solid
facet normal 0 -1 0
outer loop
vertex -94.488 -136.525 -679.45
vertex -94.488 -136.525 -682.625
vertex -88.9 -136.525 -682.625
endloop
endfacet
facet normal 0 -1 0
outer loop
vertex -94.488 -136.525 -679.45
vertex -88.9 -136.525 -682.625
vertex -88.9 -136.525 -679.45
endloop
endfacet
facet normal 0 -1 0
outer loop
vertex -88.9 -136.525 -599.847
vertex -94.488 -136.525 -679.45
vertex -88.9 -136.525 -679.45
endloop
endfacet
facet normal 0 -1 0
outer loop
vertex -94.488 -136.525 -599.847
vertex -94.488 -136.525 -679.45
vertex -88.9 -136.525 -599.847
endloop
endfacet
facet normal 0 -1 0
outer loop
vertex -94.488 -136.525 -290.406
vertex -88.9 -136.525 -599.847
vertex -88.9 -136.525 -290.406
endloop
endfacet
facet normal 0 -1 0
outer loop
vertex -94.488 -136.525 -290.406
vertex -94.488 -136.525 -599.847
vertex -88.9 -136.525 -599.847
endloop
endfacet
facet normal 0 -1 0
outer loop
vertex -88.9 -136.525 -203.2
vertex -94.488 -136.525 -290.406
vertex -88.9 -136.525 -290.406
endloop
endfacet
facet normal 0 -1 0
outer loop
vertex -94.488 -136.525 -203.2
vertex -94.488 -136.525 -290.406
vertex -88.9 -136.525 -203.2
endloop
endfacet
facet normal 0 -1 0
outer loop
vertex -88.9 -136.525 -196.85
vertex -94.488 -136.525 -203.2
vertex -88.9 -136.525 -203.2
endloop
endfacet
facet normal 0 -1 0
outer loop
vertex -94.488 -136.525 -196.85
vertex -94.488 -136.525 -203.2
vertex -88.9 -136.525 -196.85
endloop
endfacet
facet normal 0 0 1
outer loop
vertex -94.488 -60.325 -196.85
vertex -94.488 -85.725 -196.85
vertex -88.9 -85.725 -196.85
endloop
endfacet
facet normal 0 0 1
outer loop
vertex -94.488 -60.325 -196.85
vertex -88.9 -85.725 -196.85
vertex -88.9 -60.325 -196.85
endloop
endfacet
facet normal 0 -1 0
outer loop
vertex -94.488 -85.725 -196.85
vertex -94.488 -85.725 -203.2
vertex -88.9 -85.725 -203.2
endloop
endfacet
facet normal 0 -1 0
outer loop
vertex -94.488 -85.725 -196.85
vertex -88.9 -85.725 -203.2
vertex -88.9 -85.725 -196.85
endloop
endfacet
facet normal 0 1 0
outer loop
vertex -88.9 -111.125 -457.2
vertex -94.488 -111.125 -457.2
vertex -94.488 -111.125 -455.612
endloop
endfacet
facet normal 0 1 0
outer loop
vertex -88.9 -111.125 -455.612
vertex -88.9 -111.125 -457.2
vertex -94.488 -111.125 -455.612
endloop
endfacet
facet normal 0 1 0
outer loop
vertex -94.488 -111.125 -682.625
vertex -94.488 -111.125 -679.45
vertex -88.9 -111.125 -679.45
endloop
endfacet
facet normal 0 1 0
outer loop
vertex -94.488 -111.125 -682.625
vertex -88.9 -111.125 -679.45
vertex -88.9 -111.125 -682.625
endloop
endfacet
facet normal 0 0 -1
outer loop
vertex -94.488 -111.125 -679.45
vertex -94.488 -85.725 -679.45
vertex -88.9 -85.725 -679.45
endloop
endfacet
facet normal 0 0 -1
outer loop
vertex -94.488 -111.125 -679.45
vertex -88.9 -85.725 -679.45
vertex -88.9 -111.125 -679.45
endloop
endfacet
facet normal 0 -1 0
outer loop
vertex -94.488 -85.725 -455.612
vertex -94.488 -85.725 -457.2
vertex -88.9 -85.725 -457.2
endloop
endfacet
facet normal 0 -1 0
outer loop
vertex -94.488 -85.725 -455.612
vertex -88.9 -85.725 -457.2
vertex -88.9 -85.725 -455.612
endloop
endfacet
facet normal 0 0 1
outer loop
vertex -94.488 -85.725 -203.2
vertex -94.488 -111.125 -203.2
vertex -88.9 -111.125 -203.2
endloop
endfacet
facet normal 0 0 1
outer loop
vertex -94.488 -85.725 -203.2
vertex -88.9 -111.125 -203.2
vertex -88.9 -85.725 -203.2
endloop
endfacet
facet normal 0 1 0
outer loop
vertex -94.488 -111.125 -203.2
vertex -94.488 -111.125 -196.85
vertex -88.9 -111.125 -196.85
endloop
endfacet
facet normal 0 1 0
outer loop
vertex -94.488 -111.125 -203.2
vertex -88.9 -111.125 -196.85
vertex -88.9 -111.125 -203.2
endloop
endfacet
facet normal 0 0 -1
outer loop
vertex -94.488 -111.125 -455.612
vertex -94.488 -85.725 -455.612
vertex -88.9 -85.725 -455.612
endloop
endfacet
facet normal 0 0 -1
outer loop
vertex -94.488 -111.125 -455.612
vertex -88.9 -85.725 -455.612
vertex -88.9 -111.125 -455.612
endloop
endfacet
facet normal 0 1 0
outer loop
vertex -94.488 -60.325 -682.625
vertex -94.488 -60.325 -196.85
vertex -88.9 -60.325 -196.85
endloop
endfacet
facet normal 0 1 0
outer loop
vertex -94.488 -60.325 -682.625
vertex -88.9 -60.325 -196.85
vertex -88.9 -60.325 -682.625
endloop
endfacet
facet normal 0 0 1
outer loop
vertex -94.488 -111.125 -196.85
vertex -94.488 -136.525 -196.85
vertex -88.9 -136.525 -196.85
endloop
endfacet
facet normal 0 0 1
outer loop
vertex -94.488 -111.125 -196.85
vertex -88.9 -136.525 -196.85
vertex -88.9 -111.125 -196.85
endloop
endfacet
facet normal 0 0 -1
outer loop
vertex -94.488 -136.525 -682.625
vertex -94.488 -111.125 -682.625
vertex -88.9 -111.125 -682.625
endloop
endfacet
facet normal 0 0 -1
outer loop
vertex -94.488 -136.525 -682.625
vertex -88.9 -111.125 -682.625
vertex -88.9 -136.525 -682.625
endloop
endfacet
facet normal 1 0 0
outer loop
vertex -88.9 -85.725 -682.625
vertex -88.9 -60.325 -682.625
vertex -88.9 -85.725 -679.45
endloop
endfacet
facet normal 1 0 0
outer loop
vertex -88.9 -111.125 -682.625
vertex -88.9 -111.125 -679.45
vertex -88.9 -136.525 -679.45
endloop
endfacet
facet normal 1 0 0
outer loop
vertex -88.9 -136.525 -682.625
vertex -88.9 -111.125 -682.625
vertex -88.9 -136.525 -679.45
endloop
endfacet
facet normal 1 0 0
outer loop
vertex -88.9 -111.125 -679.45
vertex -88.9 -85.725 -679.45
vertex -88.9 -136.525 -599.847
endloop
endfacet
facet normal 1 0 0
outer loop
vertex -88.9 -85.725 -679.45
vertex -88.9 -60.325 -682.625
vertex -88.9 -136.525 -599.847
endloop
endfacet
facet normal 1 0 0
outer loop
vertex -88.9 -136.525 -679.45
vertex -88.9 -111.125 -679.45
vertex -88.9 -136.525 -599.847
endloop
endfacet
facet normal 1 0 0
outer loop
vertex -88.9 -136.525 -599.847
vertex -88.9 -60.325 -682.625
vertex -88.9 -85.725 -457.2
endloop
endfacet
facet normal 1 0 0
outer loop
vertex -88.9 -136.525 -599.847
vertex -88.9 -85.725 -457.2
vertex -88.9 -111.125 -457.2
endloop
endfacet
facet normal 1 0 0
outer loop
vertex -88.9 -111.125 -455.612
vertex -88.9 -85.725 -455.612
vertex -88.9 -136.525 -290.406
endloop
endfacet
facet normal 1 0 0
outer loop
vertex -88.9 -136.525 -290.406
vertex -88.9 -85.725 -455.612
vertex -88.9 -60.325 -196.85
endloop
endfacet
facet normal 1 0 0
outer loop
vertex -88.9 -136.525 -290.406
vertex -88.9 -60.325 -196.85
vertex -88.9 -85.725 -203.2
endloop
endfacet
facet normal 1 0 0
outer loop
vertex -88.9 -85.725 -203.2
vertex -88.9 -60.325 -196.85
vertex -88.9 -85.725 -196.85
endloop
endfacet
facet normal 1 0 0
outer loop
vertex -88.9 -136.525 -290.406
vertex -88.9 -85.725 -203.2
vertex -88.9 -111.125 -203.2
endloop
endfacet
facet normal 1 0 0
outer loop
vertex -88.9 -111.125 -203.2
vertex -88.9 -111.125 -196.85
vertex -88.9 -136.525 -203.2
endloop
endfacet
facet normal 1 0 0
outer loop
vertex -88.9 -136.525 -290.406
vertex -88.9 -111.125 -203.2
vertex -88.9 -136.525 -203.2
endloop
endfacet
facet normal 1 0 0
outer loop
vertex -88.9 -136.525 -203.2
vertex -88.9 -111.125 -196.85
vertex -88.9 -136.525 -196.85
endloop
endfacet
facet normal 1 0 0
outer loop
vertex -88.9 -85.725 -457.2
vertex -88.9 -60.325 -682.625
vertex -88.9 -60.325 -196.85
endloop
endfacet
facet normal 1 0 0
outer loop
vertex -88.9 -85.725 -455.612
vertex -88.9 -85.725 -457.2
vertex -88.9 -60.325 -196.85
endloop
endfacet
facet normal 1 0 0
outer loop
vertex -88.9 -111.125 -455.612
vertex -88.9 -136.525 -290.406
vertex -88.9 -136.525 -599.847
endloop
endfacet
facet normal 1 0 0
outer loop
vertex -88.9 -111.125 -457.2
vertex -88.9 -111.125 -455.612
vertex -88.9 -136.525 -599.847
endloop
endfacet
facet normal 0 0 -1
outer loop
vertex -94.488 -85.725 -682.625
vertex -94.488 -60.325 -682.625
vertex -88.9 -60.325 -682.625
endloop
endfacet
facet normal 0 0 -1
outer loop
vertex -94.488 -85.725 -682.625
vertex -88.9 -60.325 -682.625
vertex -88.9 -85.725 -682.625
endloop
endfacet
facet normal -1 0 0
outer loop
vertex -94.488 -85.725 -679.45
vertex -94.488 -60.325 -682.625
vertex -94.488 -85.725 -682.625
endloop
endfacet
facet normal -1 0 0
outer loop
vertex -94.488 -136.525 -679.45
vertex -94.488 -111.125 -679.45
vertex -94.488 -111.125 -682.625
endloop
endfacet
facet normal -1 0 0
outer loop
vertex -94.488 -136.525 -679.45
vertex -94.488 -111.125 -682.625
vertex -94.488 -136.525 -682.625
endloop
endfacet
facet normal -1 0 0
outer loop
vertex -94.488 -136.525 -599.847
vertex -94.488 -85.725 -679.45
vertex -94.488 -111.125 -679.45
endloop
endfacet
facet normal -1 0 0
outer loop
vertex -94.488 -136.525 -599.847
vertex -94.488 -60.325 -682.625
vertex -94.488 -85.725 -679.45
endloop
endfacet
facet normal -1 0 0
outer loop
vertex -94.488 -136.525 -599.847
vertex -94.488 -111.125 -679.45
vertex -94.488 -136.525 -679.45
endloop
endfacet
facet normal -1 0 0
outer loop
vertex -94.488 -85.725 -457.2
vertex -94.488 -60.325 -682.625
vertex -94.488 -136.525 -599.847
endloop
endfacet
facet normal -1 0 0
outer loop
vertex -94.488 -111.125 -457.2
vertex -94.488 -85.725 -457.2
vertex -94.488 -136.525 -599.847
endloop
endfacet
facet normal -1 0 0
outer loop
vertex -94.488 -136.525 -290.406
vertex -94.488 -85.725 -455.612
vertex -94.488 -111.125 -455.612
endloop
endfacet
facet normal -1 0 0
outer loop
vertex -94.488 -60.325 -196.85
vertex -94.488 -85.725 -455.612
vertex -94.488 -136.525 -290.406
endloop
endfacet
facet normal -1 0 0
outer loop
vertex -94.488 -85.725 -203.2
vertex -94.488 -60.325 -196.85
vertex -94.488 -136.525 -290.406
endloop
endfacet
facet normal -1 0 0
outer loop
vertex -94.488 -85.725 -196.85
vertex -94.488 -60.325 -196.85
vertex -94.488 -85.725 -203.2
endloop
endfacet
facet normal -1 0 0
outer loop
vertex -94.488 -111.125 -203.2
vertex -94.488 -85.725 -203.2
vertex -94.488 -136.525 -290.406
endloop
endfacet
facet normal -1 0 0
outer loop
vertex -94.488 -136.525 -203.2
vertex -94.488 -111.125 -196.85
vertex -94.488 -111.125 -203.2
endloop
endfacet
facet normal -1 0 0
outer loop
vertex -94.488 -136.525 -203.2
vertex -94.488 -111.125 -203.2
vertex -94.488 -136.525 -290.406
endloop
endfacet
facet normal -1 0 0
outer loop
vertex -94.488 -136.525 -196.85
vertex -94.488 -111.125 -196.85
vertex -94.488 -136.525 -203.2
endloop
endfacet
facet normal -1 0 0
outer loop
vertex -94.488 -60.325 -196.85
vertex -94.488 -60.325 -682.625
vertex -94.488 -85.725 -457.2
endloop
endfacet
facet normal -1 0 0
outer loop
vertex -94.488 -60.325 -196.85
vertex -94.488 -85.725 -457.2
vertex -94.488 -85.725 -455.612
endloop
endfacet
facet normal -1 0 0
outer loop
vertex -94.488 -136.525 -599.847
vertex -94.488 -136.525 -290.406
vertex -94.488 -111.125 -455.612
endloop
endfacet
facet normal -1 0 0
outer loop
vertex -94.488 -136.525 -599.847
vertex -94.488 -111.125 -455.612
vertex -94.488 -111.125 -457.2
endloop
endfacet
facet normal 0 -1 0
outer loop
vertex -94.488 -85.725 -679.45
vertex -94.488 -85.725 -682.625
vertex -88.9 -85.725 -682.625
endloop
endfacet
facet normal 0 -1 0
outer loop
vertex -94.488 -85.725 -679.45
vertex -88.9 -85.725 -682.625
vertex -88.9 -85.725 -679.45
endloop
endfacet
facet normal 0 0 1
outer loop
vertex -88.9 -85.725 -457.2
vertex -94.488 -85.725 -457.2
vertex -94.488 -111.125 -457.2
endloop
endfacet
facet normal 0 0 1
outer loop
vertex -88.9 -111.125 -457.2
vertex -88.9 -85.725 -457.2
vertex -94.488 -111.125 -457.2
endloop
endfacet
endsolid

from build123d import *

# Parameters (mm, degrees)
SKETCH1_W           = 25.4
SKETCH1_H           = 1.5875
BOSS_EXTRUDE1_DEPTH = 5.588
SKETCH2_W           = 545.634359946
SKETCH2_H           = 68.698432751
CUT_EXTRUDE1_DEPTH  = 7.62


with BuildPart() as part:
    # Sketch1 → Boss-Extrude1 (new body)
    # profile 1 of 3: a face of its own
    with BuildSketch(Plane(origin=(-94.488, 0, 0), x_dir=(0, -1, 0), z_dir=(-1, 0, 0))):
        Polygon((136.525, -196.85), (111.125, -196.85), (111.125, -203.2), (85.725, -203.2), (85.725, -196.85), (60.325, -196.85), (60.325, -682.625), (85.725, -682.625), (85.725, -679.45), (111.125, -679.45), (111.125, -682.625), (136.525, -682.625), align=None)
        with Locations((98.425, -456.40625)):
            Rectangle(SKETCH1_W, SKETCH1_H, mode=Mode.SUBTRACT)
    # profile 2 of 3: a face of its own
    with BuildSketch(Plane(origin=(-94.488, 0, 0), x_dir=(0, -1, 0), z_dir=(-1, 0, 0))):
        with BuildLine():
            Line((149.225, -203.2), (136.525, -203.2))
            Line((136.525, -203.2), (136.525, -290.406498707))
            ThreePointArc((136.525, -290.406498707), (137.30121982, -286.034603668), (139.534994681, -282.197126202))
            Line((139.534994681, -282.197126202), (184.118202659, -229.57294303))
            ThreePointArc((184.118202659, -229.57294303), (185.23509009, -227.654204297), (185.6232, -225.468256778))
            Line((185.6232, -225.468256778), (185.6232, -203.2))
            Line((185.6232, -203.2), (168.275, -203.2))
            Line((168.275, -203.2), (168.275, -196.85))
            Line((168.275, -196.85), (149.225, -196.85))
            Line((149.225, -196.85), (149.225, -203.2))
        make_face()
    # profile 3 of 3: a face of its own
    with BuildSketch(Plane(origin=(-94.488, 0, 0), x_dir=(0, -1, 0), z_dir=(-1, 0, 0))):
        with BuildLine():
            ThreePointArc((138.226477372, -606.197045256), (136.957742006, -603.134047129), (136.525, -599.847045256))
            Line((136.525, -599.847045256), (136.525, -679.45))
            Line((136.525, -679.45), (146.05, -679.45))
            Line((146.05, -679.45), (146.05, -684.2125))
            Line((146.05, -684.2125), (161.925, -684.2125))
            Line((161.925, -684.2125), (161.925, -679.45))
            Line((161.925, -679.45), (171.45, -679.45))
            Line((171.45, -679.45), (171.45, -665.443351826))
            ThreePointArc((171.45, -665.443351826), (171.233628997, -663.79985089), (170.599261314, -662.268351826))
            Line((170.599261314, -662.268351826), (138.226477372, -606.197045256))
        make_face()
    extrude(amount=-BOSS_EXTRUDE1_DEPTH)

    # Sketch2 → Cut-Extrude1 (cut)
    with BuildSketch(Plane(origin=(-88.9, 0, 0), x_dir=(0, 0, -1), z_dir=(1, 0, 0))):
        with Locations((441.133658402, -170.874216375)):
            Rectangle(SKETCH2_W, SKETCH2_H)
    extrude(amount=-CUT_EXTRUDE1_DEPTH, mode=Mode.SUBTRACT)


solid = part.part
